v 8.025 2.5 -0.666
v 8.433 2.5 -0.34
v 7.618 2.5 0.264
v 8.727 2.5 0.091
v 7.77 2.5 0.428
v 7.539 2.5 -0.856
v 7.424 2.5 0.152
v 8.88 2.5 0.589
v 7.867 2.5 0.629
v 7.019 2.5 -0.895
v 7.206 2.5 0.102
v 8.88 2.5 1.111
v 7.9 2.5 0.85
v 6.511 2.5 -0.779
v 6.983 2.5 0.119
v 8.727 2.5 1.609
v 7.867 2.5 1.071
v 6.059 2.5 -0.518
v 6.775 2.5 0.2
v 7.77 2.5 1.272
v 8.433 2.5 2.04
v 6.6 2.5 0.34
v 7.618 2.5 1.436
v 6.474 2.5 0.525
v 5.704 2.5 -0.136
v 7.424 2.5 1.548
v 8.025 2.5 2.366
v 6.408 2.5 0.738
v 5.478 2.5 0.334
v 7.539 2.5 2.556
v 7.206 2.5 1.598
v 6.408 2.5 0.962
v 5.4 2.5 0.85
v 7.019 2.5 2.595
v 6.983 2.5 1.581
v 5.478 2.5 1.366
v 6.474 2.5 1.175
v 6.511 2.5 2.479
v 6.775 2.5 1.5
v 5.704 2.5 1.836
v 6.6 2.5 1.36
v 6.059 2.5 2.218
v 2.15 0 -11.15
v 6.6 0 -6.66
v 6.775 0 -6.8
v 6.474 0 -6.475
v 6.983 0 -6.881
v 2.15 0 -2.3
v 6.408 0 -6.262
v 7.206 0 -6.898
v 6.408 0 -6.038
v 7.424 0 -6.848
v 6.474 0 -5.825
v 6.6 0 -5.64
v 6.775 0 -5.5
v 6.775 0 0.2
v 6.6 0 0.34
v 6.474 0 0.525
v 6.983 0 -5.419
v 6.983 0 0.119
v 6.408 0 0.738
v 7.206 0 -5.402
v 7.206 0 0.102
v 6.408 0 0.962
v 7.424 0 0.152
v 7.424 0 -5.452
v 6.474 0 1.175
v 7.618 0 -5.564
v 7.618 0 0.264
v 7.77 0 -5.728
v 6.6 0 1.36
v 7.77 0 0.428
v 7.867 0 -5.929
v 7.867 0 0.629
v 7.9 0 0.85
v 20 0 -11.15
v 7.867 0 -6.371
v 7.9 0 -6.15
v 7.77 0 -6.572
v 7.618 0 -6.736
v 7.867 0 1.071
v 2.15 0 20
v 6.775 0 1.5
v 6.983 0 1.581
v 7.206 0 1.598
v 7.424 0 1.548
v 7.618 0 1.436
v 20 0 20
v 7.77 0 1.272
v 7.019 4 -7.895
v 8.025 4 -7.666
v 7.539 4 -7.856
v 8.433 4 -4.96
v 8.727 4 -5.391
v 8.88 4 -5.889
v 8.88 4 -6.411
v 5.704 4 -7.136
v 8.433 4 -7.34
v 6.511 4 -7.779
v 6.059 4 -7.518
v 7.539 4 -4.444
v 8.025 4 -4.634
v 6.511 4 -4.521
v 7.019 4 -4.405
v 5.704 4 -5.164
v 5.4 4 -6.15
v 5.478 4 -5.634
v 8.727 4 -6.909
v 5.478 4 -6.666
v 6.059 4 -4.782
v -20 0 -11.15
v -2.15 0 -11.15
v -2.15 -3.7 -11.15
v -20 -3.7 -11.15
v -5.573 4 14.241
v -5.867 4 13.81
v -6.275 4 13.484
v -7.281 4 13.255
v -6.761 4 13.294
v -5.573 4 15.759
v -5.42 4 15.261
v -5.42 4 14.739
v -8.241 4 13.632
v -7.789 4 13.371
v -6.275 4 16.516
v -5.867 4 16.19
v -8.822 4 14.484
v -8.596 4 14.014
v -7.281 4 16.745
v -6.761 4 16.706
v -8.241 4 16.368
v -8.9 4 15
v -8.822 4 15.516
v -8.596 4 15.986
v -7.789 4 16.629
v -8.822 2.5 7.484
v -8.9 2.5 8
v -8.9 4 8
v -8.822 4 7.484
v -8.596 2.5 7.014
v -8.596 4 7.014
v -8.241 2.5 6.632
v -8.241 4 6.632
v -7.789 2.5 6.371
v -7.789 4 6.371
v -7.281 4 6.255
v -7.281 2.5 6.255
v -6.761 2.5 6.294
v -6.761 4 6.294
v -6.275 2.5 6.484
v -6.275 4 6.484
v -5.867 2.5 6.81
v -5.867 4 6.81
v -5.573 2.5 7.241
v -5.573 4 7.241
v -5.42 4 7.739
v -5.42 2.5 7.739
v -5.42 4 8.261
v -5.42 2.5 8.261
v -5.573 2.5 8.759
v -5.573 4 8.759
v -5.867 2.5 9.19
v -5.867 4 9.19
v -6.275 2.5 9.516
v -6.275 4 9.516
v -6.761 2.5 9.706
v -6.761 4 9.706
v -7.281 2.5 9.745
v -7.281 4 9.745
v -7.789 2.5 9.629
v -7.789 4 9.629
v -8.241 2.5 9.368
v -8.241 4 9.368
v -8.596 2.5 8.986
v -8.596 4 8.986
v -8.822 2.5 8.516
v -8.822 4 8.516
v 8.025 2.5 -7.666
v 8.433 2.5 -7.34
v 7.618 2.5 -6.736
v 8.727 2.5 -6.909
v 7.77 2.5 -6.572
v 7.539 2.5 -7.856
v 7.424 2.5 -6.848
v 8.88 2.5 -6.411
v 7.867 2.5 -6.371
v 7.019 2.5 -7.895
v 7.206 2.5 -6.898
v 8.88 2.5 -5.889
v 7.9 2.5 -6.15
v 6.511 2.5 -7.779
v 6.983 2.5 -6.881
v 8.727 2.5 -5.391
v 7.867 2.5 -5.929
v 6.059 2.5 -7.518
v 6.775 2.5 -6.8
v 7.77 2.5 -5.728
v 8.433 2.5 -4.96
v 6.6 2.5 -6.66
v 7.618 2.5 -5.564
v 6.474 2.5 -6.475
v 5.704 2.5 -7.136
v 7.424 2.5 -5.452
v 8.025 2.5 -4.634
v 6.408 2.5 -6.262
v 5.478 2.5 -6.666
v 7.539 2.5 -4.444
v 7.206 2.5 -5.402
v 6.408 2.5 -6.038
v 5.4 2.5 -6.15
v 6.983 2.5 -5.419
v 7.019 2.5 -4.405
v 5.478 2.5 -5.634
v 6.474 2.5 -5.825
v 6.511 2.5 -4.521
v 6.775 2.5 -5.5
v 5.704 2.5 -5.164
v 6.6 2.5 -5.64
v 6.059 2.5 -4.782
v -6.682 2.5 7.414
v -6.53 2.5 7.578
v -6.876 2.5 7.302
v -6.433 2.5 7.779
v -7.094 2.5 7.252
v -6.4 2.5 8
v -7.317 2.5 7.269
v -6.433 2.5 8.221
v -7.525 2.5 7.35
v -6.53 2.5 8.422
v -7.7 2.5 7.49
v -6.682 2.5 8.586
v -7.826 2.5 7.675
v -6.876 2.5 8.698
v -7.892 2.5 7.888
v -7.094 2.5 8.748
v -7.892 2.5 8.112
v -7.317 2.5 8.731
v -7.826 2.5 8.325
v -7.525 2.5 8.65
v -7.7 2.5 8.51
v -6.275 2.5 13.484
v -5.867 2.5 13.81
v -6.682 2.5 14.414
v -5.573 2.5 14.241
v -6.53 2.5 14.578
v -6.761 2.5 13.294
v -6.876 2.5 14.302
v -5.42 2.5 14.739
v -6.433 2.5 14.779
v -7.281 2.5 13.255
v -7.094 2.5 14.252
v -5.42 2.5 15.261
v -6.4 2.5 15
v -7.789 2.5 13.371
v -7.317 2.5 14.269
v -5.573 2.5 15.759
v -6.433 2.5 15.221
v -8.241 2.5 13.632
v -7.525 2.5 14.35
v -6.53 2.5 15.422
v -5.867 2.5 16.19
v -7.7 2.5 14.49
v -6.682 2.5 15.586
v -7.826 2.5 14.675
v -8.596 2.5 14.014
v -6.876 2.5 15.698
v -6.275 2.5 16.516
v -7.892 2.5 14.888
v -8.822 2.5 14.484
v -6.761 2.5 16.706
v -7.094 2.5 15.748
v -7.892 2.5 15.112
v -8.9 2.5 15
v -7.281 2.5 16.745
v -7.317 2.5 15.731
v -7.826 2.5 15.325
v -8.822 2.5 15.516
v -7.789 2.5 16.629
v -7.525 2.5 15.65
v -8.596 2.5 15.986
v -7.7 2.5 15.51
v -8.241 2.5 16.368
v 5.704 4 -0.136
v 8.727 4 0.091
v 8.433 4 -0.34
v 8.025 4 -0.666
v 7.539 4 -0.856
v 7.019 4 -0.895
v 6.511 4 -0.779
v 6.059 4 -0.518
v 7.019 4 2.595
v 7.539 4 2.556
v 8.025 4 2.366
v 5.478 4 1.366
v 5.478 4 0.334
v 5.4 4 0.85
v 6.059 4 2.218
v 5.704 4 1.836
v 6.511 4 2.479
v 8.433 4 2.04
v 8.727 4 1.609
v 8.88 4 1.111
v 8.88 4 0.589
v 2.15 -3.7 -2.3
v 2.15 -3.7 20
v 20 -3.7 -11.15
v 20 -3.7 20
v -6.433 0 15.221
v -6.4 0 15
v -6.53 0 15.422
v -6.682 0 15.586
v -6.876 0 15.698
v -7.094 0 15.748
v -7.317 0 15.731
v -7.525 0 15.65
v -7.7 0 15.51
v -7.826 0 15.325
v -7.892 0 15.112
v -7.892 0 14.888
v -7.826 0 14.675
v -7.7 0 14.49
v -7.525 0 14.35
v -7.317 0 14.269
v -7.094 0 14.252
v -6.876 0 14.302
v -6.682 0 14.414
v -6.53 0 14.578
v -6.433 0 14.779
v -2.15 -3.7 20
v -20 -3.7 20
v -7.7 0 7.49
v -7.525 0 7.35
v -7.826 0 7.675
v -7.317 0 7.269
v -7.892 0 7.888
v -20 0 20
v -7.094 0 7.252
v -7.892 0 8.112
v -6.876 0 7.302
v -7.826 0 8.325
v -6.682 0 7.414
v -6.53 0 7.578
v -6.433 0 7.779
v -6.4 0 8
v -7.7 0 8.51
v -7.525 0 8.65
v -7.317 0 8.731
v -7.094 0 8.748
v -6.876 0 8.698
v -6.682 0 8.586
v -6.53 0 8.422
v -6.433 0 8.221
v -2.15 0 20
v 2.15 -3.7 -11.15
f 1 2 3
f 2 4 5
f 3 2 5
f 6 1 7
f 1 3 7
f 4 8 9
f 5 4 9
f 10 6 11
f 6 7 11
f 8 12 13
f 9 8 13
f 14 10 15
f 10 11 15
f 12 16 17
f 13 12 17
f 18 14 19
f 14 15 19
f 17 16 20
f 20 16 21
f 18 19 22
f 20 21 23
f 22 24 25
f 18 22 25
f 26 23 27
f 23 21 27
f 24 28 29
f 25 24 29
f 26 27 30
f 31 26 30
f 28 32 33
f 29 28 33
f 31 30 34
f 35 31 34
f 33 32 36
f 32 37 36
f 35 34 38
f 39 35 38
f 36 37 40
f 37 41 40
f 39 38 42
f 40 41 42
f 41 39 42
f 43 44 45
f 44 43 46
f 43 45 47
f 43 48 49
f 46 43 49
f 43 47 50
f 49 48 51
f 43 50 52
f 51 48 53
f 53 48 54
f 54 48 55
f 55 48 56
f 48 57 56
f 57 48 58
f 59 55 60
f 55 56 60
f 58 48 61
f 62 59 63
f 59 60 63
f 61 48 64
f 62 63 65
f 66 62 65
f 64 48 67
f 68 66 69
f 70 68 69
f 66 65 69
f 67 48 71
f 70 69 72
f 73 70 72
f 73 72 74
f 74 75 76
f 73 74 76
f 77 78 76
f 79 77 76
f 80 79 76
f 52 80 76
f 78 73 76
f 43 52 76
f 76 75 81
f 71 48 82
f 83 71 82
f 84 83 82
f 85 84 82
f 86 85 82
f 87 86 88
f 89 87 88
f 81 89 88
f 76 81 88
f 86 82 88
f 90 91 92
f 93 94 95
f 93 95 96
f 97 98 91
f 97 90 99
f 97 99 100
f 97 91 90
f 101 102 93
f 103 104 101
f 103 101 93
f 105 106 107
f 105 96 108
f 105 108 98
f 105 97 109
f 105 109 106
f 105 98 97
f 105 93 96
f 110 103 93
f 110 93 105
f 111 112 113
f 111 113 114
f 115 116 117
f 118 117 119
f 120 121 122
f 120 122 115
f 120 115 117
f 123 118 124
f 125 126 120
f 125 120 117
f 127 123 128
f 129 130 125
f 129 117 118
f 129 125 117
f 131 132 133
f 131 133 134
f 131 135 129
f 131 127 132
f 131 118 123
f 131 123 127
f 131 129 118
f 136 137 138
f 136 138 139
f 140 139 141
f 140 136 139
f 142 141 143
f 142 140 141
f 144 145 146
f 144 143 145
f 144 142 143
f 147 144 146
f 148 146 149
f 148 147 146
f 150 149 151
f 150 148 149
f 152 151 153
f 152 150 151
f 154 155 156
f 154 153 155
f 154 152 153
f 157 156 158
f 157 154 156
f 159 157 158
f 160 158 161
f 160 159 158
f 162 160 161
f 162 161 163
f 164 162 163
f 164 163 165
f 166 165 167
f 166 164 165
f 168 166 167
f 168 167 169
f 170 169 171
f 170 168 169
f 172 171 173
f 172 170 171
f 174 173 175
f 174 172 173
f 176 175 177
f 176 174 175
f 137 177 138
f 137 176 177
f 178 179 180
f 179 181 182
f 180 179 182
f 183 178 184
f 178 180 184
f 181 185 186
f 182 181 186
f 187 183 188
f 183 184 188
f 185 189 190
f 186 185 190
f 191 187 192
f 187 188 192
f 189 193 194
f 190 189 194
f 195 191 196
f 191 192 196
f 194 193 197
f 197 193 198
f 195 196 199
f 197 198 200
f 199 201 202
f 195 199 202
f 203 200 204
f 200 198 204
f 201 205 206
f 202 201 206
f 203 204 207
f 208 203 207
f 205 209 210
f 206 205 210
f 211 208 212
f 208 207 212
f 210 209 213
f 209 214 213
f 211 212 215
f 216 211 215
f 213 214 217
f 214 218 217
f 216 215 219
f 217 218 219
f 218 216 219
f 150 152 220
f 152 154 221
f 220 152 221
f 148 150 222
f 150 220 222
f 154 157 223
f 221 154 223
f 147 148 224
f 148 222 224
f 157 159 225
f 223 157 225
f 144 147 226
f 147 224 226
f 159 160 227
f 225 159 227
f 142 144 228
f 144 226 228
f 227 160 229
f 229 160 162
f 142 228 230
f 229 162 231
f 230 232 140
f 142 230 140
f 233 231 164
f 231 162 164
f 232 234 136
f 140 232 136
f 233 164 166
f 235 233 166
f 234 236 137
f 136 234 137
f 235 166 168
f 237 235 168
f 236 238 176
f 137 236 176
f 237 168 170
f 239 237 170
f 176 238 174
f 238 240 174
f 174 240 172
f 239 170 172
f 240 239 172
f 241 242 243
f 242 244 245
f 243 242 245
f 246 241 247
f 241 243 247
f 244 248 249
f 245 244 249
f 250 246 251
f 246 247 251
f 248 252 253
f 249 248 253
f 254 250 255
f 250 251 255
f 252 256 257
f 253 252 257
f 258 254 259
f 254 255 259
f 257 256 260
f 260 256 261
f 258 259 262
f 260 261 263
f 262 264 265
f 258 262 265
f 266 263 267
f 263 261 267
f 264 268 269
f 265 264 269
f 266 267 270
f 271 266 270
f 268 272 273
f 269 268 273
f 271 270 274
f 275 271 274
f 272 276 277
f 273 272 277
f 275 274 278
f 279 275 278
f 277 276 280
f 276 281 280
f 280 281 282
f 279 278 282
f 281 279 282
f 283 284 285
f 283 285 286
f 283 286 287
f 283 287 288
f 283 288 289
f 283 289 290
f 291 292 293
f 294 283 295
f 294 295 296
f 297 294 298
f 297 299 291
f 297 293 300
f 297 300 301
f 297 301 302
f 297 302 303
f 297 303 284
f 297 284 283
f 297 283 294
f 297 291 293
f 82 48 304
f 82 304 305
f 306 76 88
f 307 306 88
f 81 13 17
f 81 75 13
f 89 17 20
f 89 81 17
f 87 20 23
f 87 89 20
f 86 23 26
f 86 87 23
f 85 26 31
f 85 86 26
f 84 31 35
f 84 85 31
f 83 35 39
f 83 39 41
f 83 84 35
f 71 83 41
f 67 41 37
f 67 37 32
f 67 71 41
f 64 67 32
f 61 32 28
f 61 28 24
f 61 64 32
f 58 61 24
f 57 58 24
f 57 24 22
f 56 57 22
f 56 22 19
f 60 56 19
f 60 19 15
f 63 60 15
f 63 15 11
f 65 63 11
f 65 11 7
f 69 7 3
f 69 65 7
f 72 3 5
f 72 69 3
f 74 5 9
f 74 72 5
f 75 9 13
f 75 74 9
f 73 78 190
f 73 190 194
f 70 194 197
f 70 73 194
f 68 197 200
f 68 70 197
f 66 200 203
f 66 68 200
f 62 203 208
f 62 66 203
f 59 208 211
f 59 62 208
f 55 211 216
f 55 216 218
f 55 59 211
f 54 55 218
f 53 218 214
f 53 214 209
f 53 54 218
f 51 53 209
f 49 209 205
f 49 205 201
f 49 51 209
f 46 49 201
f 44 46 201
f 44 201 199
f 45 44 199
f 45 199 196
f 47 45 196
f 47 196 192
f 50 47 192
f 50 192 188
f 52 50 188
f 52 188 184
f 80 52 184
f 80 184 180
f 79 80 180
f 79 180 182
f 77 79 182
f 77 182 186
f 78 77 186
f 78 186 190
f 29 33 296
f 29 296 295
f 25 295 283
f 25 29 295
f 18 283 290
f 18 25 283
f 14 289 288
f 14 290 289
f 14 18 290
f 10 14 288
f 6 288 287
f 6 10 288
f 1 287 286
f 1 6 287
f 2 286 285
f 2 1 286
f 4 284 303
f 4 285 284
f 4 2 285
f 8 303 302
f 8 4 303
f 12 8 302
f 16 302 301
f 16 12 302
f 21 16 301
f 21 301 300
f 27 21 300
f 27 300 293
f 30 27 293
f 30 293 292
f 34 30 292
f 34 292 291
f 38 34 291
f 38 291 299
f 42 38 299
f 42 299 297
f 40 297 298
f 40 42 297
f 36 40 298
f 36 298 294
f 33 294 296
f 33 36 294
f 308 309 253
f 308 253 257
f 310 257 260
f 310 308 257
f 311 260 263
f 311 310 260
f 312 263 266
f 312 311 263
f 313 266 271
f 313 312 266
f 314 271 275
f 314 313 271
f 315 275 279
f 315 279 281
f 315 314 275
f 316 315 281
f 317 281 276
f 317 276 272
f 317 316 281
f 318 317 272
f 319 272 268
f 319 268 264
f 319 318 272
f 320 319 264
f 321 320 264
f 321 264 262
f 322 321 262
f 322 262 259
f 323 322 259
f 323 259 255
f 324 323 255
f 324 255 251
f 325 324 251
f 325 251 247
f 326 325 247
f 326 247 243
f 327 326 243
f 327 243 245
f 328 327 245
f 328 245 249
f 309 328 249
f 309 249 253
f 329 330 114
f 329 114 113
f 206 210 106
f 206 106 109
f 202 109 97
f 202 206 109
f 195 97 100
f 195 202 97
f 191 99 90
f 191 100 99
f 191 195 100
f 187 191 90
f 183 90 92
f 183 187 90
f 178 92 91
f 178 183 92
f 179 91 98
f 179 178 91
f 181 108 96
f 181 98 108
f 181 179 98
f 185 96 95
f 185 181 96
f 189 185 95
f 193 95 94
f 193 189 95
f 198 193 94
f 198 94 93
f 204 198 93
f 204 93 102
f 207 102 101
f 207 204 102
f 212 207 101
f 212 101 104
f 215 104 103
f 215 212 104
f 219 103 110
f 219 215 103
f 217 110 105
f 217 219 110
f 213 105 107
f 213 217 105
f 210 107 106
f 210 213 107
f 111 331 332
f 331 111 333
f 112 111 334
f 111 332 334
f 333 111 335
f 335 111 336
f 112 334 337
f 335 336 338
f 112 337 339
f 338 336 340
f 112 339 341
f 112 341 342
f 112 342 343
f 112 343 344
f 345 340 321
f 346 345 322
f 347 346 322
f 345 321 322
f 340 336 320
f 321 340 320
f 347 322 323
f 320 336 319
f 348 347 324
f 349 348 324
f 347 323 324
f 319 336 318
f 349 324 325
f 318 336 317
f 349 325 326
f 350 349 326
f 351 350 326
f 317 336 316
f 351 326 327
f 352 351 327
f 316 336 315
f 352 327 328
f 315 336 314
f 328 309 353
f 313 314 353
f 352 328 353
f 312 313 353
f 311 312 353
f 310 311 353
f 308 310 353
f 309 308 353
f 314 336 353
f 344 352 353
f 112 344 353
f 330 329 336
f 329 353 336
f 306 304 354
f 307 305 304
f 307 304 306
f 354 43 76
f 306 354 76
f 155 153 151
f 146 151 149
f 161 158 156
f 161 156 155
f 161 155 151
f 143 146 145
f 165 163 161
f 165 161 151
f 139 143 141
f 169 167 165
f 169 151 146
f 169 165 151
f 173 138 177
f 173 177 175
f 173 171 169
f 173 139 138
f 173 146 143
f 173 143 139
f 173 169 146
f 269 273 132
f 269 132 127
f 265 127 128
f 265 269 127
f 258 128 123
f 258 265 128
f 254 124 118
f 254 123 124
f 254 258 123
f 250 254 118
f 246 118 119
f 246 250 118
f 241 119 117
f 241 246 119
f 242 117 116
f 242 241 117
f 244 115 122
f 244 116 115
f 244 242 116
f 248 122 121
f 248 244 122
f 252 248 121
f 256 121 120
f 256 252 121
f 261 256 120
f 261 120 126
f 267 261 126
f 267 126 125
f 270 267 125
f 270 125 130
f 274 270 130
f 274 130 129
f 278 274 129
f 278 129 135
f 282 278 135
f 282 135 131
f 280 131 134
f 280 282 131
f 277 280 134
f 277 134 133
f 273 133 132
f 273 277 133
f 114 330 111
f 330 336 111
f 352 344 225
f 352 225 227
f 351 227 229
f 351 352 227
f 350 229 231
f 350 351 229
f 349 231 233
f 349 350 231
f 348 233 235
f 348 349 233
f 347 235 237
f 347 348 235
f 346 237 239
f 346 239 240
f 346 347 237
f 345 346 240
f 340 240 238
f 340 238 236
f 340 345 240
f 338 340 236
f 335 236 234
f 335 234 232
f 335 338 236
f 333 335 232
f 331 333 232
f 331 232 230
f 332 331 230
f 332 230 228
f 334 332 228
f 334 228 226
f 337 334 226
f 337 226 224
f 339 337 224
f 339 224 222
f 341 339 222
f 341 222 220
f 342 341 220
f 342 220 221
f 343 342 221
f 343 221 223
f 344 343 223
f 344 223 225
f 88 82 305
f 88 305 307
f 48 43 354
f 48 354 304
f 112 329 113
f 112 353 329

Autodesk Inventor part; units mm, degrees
ref_plane "YZ Plane" through (0, 0, 0) normal (1, 0, 0) x (0, 1, 0)
ref_plane "XZ Plane" through (0, 0, 0) normal (0, 1, 0) x (-1, 0, 0)
ref_plane "XY Plane" through (0, 0, 0) normal (0, 0, 1) x (1, 0, 0)
sketch "Sketch4" plane through (0, 0, 0) normal (0, 1, 0) x (-1, 0, 0)
  line L0 (20, 20) -> (-20, 20)
  line L1 (-20, 20) -> (-20, -20)
  line L2 (-20, -20) -> (20, -20)
  line L3 (20, -20) -> (20, 20)
  line L4 (20, 20) -> (-20, -20) construction
  line L5 (-20, 20) -> (20, -20) construction
  line L6 (2.15, 11.15) -> (-2.15, 11.15)
  line L7 (-2.15, 11.15) -> (-2.15, -11.15)
  line L8 (-2.15, -11.15) -> (2.15, -11.15)
  line L9 (2.15, -11.15) -> (2.15, 11.15)
  line L10 (2.15, 11.15) -> (-2.15, -11.15) construction
  line L11 (-2.15, 11.15) -> (2.15, -11.15) construction
  line L12 (2.15, 11.15) -> (20, 11.15)
  line L13 (20, 11.15) -> (20, -20)
  line L14 (20, -20) -> (2.15, -20)
  line L15 (2.15, -20) -> (2.15, 11.15)
  line L16 (-2.15, -11.15) -> (-20, -11.15)
  line L17 (-20, -11.15) -> (-20, 20)
  line L18 (-20, 20) -> (-2.15, 20)
  line L19 (-2.15, 20) -> (-2.15, -11.15)
  point P0 (0, 0)
  point P1 (-2.15, 20)
  point P2 (2.15, -20)
  dimension "d26" = 40
  dimension "d27" = 40
  dimension "d28" = 4.3
  dimension "d29" = 22.3
extrude "Extrusion4" add sketch "Sketch4" along normal blind 3.7 contours L19 L7 L16 L1 L0 | L3 L2 L15 L9 L12
sketch "Sketch5" plane through (0, 0, 0) normal (0, 1, 0) x (-1, 0, 0)
  line L0 (2.15, -20) -> (20, -20) projected
  line L1 (2.15, -20) -> (7.15, -20)
  line L2 (7.15, -20) -> (7.15, -15)
  line L3 (7.15, -15) -> (2.15, -15)
  line L4 (2.15, -15) -> (2.15, -20)
  line L5 (2.15, -20) -> (7.15, -20)
  line L6 (7.15, -20) -> (7.15, -8)
  line L7 (7.15, -8) -> (2.15, -8)
  line L8 (2.15, -8) -> (2.15, -20)
  line L9 (-2.15, -11.15) -> (-2.15, 20) projected
  line L10 (-2.15, 20) -> (-7.15, 20)
  line L11 (-7.15, 20) -> (-7.15, 15)
  line L12 (-7.15, 15) -> (-2.15, 15)
  line L13 (-2.15, 15) -> (-2.15, 20)
  line L14 (-2.15, 20) -> (-7.15, 20)
  line L15 (-7.15, 20) -> (-7.15, 8)
  line L16 (-7.15, 8) -> (-2.15, 8)
  line L17 (-2.15, 8) -> (-2.15, 20)
  circle A0 centre (-7.15, 8) radius 0.75
  circle A1 centre (-7.15, 15) radius 0.75
  circle A2 centre (7.15, -15) radius 0.75
  circle A3 centre (7.15, -8) radius 0.75
  point P0 (0, 0)
  dimension "d32" = 5
  dimension "d33" = 5
  dimension "d34" = 12
  dimension "d35" = 5
  dimension "d36" = 5
  dimension "d37" = 12
  dimension "d38" = 1.5
  dimension "d39" = 1.5
  dimension "d40" = 1.5
  dimension "d41" = 1.5
extrude "Extrusion5" add sketch "Sketch5" against normal blind 2.5 contours A2 L3 L2 | L2 L6 A2 | A2 L6 L3 | A3 L6 L7 | L7 L6 A3 | A0 L15 L16 | L16 L15 A0 | A1 L15 L12 | L12 L11 A1 | L15 A1 L11
sketch "Sketch6" plane through (-7.15, -2.5, -15) normal (0, -1, 0) x (1, 0, 0)
  circle A0 centre (0, 0) radius 1.75
  circle A1 centre (0, 7) radius 0.75 projected
  circle A2 centre (0, 7) radius 1.75
  circle A3 centre (14.3, 23) radius 0.75 projected
  circle A4 centre (14.3, 23) radius 1.75
  circle A5 centre (14.3, 30) radius 0.75 projected
  circle A6 centre (14.3, 30) radius 1.75
  point P0 (7.15, 15)
  dimension "d44" = 3.5
  dimension "d45" = 3.5
  dimension "d46" = 3.5
  dimension "d47" = 3.5
extrude "Extrusion6" add sketch "Sketch6" along normal blind 1.5 contours A0 | A1 | A2 | A3 | A4 | A5 | A6
move or copy body "Move Body1" bodies to move or copy 1 copy no rotation origin (0, 0, 0) rotation axis (0, 0, 1) rotation angle -180
split body "Split1" sketch "Sketch4" result two bodies curves L18 L19 first body at (-14.05, -3.2, 9.6167)
move or copy body "Move Body2" bodies to move or copy 3 copy no translate (0, 0, 8.85)
properties part number "top-big"
